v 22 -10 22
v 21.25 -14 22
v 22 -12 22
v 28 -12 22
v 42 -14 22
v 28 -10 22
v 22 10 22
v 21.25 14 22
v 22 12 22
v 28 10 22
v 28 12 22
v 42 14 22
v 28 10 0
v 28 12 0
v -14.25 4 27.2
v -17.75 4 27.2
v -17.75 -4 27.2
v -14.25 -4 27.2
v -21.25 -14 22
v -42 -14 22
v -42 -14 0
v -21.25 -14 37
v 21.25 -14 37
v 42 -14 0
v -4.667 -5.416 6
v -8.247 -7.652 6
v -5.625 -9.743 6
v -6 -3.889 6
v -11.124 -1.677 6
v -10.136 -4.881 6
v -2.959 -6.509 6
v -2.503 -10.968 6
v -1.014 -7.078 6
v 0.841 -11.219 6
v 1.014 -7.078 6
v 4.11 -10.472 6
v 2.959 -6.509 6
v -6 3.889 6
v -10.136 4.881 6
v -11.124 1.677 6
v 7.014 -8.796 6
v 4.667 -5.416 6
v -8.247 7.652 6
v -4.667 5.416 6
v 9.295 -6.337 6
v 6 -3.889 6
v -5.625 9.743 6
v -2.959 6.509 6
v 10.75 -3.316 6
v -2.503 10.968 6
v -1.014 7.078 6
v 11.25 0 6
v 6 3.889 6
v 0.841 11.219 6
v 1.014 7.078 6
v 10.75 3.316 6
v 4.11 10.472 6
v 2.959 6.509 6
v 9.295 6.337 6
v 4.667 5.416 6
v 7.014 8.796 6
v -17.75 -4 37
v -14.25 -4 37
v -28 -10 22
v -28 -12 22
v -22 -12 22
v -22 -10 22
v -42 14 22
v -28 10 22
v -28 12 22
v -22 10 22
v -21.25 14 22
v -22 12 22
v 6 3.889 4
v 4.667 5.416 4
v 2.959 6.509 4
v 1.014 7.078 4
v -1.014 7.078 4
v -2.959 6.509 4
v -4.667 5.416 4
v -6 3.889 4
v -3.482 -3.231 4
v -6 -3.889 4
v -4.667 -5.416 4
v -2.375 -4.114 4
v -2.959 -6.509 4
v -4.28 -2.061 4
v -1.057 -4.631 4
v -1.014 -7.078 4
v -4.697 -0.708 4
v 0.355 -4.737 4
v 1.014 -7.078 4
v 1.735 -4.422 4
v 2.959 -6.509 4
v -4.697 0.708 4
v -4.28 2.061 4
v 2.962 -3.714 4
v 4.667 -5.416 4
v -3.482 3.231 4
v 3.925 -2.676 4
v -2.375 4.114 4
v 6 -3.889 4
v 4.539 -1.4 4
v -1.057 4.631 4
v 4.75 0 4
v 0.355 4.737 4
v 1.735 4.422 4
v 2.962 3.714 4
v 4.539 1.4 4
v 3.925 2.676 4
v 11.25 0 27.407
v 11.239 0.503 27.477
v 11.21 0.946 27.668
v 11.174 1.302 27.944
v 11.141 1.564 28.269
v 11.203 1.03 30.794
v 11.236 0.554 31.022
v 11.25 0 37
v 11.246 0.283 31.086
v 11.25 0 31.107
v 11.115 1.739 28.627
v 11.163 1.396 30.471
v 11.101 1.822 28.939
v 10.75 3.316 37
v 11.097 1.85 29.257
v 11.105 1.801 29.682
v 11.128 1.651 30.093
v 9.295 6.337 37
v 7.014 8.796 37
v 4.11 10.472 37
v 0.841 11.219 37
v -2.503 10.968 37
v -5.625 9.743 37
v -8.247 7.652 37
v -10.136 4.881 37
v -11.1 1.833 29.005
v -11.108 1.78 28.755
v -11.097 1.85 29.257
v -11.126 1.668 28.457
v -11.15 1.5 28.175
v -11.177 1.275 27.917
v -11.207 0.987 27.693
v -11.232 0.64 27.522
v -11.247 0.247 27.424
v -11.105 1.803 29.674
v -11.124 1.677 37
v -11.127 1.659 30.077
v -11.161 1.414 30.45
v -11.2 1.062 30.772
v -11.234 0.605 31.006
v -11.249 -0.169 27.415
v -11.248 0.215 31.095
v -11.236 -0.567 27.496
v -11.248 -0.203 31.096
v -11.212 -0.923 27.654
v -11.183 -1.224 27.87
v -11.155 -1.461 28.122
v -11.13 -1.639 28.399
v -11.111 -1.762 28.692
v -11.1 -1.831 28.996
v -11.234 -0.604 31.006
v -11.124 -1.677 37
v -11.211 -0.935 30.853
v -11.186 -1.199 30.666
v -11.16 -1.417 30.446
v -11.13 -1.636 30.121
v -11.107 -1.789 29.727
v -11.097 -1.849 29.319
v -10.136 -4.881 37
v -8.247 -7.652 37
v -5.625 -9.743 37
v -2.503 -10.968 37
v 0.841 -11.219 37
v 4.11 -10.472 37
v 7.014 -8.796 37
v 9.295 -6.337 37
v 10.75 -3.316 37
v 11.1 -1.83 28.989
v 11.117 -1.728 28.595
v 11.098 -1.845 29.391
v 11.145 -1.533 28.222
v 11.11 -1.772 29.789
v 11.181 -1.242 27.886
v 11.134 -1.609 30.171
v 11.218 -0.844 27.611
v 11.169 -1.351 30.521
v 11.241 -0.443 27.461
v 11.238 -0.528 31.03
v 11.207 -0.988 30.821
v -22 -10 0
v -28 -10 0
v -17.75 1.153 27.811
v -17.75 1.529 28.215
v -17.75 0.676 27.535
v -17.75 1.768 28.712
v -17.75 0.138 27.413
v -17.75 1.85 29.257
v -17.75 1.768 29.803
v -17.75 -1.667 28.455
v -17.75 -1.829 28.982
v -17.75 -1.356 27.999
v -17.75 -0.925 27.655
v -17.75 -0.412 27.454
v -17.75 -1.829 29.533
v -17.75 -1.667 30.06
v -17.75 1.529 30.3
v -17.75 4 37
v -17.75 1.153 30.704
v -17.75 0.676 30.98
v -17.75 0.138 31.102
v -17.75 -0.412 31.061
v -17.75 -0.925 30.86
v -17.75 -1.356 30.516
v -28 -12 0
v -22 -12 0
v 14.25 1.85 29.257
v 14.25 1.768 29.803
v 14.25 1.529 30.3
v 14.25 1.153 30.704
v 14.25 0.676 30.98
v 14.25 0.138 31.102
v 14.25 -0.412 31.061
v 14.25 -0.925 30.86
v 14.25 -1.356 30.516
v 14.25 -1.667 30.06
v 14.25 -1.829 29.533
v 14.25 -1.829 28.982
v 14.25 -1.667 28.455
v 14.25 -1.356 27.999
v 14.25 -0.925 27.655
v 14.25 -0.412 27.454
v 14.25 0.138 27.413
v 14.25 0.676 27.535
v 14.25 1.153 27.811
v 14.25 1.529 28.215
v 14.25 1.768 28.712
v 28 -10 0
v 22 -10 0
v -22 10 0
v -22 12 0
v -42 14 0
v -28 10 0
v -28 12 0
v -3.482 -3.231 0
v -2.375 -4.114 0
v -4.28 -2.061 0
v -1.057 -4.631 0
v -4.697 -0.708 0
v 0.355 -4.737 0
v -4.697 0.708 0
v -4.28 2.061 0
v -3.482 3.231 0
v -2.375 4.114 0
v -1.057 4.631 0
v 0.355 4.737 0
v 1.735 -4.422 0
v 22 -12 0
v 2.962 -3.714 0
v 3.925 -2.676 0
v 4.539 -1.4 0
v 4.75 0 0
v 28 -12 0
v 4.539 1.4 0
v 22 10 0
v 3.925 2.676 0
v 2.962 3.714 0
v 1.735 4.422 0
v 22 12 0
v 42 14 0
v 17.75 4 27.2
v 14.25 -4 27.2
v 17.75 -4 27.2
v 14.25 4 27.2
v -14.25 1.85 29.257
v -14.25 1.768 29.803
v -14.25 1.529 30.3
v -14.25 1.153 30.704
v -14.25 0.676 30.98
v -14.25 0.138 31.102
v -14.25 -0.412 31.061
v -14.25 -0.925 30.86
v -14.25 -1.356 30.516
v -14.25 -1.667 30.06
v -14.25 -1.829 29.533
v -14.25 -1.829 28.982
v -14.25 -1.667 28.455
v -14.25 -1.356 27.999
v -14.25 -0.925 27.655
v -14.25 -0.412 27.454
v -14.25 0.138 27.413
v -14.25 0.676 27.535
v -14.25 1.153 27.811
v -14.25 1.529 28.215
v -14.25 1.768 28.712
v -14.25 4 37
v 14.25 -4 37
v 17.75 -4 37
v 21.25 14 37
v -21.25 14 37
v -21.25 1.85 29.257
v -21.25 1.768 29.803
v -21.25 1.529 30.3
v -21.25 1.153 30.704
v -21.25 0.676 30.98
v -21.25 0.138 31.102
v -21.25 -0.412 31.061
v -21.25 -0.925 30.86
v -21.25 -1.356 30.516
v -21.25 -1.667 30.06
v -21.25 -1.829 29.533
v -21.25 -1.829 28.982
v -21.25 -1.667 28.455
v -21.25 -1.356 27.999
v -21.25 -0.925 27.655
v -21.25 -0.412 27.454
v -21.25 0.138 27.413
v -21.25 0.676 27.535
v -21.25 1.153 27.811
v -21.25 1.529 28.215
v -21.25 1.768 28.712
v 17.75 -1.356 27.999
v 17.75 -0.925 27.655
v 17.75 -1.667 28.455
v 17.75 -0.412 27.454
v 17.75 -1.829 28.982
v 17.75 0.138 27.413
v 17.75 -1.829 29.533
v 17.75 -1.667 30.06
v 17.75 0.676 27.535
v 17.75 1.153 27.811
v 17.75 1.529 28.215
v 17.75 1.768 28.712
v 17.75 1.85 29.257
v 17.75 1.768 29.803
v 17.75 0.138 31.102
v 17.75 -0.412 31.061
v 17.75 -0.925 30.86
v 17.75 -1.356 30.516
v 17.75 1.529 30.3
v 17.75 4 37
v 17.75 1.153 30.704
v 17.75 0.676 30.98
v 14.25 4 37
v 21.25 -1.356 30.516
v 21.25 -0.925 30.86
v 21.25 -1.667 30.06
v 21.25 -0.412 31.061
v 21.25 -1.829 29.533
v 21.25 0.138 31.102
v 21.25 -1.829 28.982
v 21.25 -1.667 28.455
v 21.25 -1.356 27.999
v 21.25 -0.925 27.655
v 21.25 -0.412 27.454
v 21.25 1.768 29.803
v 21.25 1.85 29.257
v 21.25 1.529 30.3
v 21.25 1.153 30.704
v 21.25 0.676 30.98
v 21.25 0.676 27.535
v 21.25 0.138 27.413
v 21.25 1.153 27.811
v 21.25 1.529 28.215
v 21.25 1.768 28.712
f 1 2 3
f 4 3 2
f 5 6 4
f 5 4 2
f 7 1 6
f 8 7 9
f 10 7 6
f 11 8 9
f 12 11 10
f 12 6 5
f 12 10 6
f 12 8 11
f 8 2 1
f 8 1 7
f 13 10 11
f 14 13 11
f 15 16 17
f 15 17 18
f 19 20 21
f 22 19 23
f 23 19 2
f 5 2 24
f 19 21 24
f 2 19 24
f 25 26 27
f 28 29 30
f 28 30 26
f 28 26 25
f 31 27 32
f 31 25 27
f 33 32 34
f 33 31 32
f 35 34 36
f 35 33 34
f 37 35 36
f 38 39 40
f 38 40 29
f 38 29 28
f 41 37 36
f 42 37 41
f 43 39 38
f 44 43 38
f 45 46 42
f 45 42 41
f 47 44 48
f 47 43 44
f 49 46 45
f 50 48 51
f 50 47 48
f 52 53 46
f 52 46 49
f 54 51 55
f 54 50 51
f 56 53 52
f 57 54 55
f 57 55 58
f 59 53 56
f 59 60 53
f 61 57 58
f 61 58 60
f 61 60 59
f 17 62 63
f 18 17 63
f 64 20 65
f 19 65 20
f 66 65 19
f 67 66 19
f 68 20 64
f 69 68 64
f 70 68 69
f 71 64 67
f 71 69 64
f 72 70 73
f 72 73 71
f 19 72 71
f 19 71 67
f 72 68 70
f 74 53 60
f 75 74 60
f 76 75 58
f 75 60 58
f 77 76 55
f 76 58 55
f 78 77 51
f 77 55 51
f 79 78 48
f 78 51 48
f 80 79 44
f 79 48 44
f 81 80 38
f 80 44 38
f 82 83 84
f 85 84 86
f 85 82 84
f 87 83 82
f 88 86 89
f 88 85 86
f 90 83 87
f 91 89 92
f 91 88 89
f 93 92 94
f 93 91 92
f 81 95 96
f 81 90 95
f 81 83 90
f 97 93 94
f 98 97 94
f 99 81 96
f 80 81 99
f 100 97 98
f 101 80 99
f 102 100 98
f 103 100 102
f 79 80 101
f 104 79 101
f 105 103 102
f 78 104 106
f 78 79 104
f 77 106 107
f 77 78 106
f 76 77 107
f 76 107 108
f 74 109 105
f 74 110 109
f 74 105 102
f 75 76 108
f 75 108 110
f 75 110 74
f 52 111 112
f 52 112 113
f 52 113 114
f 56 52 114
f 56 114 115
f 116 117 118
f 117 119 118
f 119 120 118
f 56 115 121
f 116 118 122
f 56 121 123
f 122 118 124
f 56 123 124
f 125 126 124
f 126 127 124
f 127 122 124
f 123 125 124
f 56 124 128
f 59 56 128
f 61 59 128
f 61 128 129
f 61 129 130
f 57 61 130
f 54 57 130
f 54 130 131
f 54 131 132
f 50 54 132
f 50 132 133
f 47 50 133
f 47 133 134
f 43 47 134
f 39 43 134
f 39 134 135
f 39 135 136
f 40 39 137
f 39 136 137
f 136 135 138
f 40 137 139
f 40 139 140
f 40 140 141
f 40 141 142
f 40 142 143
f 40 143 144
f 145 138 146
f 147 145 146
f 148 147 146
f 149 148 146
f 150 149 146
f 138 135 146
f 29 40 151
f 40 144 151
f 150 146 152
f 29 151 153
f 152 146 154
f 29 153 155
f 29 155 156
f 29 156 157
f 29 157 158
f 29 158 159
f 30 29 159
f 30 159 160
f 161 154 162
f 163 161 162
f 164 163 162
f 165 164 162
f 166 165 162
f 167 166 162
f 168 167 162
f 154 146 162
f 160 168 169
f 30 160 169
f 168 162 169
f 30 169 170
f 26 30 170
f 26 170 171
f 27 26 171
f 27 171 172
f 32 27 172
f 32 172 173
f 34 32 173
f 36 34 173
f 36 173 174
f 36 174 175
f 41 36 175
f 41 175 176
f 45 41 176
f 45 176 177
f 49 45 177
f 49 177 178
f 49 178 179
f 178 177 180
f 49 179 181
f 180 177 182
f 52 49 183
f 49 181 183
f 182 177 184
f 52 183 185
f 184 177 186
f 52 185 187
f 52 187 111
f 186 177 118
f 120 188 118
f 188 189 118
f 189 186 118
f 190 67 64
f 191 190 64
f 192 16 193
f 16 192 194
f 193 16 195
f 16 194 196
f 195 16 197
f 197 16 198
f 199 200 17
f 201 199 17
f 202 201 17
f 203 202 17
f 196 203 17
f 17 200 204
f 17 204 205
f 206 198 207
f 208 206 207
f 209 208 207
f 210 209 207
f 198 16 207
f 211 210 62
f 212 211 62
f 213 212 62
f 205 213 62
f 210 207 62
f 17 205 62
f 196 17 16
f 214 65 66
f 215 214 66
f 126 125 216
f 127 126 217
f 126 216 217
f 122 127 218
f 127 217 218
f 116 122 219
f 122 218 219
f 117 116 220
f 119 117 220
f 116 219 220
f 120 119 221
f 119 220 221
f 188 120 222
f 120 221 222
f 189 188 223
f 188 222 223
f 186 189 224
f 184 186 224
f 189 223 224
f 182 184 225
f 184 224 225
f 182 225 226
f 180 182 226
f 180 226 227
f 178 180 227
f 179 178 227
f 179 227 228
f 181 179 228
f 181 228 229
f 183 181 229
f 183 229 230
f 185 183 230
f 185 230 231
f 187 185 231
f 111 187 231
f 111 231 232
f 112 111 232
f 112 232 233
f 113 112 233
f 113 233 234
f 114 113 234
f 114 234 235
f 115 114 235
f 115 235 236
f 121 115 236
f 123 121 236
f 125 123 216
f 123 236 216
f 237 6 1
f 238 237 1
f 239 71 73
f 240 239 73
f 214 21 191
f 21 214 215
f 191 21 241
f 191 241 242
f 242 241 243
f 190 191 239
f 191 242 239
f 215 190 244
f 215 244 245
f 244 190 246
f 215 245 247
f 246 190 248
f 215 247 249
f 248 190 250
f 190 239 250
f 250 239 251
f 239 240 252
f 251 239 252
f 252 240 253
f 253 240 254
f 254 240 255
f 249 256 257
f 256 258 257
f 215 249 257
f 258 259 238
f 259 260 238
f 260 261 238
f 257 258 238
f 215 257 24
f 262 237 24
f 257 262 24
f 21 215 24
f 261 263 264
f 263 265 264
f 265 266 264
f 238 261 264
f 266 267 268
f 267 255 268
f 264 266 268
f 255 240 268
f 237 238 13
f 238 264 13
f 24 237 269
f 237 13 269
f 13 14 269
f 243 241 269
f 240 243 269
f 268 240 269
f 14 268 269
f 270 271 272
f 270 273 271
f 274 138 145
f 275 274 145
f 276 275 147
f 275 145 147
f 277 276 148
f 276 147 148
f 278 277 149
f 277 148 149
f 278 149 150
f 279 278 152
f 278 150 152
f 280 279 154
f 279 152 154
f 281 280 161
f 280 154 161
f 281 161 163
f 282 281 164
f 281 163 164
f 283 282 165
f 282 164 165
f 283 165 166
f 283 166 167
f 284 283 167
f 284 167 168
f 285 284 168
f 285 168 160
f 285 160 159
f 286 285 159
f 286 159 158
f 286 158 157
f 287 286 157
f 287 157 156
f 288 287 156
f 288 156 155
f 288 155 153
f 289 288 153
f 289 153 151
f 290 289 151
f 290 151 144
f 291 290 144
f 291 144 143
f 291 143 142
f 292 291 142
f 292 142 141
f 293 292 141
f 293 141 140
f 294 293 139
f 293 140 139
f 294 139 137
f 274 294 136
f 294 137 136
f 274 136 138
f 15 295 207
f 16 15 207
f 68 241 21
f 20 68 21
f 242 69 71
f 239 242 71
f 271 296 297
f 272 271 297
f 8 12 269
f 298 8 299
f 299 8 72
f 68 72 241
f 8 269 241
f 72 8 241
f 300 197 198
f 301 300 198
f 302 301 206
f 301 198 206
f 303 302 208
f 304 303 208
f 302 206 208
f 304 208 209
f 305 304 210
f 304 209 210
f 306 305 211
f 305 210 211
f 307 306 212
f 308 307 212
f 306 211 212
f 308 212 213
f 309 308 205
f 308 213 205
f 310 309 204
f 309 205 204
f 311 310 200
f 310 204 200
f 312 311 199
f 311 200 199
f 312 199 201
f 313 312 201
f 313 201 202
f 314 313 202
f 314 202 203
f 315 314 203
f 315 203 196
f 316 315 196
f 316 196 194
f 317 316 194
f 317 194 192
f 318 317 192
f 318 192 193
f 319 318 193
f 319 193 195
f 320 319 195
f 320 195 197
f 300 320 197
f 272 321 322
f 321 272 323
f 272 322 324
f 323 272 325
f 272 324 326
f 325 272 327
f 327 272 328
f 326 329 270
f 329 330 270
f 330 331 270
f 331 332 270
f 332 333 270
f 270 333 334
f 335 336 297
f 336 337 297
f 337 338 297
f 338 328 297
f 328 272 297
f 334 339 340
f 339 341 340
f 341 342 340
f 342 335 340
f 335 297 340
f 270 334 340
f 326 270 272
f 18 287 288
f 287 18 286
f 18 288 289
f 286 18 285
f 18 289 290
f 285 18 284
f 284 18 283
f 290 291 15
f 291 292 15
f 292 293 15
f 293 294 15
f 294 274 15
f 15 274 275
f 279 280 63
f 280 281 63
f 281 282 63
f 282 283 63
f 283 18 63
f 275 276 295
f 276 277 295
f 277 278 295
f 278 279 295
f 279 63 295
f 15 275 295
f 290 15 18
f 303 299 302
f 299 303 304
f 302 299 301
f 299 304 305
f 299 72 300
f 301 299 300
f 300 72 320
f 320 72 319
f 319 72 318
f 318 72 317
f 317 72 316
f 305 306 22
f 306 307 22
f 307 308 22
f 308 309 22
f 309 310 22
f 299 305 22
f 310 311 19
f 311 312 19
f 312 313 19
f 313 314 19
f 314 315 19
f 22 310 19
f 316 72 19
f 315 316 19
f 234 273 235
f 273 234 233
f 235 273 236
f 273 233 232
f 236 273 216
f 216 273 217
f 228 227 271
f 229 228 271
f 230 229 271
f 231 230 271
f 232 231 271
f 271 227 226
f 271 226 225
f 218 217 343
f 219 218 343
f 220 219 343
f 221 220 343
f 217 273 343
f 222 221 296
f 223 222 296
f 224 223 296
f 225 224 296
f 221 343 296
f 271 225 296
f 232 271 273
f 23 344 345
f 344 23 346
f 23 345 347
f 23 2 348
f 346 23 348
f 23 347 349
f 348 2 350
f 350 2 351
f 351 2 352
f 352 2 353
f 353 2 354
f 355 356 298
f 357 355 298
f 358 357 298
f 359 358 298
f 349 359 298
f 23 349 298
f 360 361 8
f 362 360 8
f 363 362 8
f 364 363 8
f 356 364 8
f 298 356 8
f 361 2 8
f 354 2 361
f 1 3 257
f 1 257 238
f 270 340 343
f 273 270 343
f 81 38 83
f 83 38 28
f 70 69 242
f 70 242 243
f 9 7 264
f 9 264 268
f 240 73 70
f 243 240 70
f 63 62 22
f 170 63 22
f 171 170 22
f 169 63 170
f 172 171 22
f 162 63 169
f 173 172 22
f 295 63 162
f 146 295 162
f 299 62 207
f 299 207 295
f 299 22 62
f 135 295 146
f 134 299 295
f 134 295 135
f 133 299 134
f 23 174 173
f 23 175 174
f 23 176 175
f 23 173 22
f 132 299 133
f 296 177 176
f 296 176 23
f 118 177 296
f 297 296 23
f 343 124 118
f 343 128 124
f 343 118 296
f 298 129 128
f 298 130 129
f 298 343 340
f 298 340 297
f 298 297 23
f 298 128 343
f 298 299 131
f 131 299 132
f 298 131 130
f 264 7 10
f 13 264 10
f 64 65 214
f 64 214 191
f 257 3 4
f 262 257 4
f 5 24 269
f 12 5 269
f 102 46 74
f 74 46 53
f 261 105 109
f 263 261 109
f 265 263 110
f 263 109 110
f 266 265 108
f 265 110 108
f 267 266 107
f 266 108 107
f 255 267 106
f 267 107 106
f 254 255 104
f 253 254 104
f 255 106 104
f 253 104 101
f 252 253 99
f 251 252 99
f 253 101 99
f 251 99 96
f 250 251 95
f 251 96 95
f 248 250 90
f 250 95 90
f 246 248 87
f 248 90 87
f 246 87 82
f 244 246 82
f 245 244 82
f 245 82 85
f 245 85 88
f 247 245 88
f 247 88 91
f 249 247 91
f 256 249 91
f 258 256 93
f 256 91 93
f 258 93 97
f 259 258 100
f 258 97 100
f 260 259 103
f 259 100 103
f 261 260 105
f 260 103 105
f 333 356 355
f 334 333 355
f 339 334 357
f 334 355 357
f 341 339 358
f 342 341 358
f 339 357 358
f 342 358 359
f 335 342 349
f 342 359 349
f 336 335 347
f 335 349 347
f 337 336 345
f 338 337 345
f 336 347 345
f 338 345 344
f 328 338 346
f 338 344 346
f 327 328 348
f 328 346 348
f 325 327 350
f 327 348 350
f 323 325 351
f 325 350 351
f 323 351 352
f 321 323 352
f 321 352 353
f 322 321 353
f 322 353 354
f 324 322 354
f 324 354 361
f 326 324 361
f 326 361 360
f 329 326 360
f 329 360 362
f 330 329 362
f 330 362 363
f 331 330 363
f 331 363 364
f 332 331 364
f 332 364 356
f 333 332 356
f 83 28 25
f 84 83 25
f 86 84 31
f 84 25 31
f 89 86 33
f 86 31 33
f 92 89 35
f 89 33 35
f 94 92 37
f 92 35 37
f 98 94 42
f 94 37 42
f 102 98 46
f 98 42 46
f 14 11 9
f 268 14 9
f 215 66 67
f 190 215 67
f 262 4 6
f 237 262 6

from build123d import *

# Parameters (mm, degrees)
F1_DEPTH  = 22
F3_R      = 11.25
F4_DEPTH  = 16
F5_DEPTH  = 18
F6_R      = 4.75
F7_DEPTH  = 4
F8_W      = 3
F8_H      = 2
F9_DEPTH  = 22
F11_DEPTH = 15
F12_R     = 11.25
F13_DEPTH = 15
F14_R     = 1.85
F15_DEPTH = 50.8
F17_DEPTH = 9.8


# Not quite as in the source:
# - a feature names something its author has since deleted; it is built from what else it names


with BuildPart() as f1:
    # F0 (on Top) → F1 (new body)
    with BuildSketch(Plane.XY):
        with BuildLine():
            ThreePointArc((1.21e-08, -14), (9.8994949409, -9.8994949323), (14, 0))
            ThreePointArc((14, 0), (9.8994949202, 9.899494953), (-4.65e-08, 14))
            ThreePointArc((-4.65e-08, 14), (-14, -2.93e-08), (1.21e-08, -14))
        make_face()
        with BuildLine():
            ThreePointArc((-4.65e-08, 14), (9.8994949202, 9.899494953), (14, 0))
            ThreePointArc((14, 0), (9.8994949409, -9.8994949323), (1.21e-08, -14))
            Line((1.21e-08, -14), (42, -14))
            Line((42, -14), (42, 14))
            Line((42, 14), (-4.65e-08, 14))
        make_face()
        with BuildLine():
            ThreePointArc((1.21e-08, -14), (-14, -2.93e-08), (-4.65e-08, 14))
            Line((-4.65e-08, 14), (-42, 14))
            Line((-42, 14), (-42, -14))
            Line((-42, -14), (1.21e-08, -14))
        make_face()
    extrude(amount=F1_DEPTH)

    # F3 (on face) → F4 (cut)
    with BuildSketch(Plane.XY.offset(22)):
        Circle(F3_R)
    extrude(amount=-F4_DEPTH, mode=Mode.SUBTRACT)

    # F2 (on face) → F5 (cut)
    with BuildSketch(Plane.XY.offset(22)):
        with BuildLine():
            Line((-6, 3.8887658711), (-6, -3.8887658711))
            ThreePointArc((-6, -3.8887658711), (0, -7.15), (6, -3.8887658711))
            Line((6, -3.8887658711), (6, 3.8887658711))
            ThreePointArc((6, 3.8887658711), (0, 7.15), (-6, 3.8887658711))
        make_face()
    extrude(amount=-F5_DEPTH, mode=Mode.SUBTRACT)

    # F6 (on face) → F7 (cut)
    with BuildSketch(Plane.XY.offset(4)):
        Circle(F6_R)
    extrude(amount=-F7_DEPTH, mode=Mode.SUBTRACT)

    # F8 (on face) → F9 (cut)
    with BuildSketch(Plane.XY.offset(22)):
        with Locations((-26.5, 11)):
            Rectangle(F8_W, F8_H)
        with Locations((-23.5, 11)):
            Rectangle(F8_W, F8_H)
        with Locations((-23.5, -11)):
            Rectangle(F8_W, F8_H)
        with Locations((-26.5, -11)):
            Rectangle(F8_W, F8_H)
        with Locations((23.5, 11)):
            Rectangle(F8_W, F8_H)
        with Locations((26.5, 11)):
            Rectangle(F8_W, F8_H)
        with Locations((26.5, -11)):
            Rectangle(F8_W, F8_H)
        with Locations((23.5, -11)):
            Rectangle(F8_W, F8_H)
    extrude(amount=-F9_DEPTH, mode=Mode.SUBTRACT)

    # F10 (on face) → F11 (join)
    with BuildSketch(Plane.XY.offset(22)):
        Polygon((-21.25, -14), (21.25, -14), (21.25, 0), (21.25, 14), (-21.25, 14), align=None)
    extrude(amount=F11_DEPTH)

    # F12 (on face) → F13 (cut)
    with BuildSketch(Plane.XY.offset(37)):
        Circle(F12_R)
    extrude(amount=-F13_DEPTH, mode=Mode.SUBTRACT)

    # F14 (on face) → F15 (cut)
    with BuildSketch(Plane.YZ.offset(21.25)):
        with Locations((0, 29.2573869228)):
            Circle(F14_R)
    extrude(amount=-F15_DEPTH, mode=Mode.SUBTRACT)

    # F16 (on face) → F17 (cut)
    with BuildSketch(Plane.XY.offset(37)):
        Polygon((-14.25, -4), (-14.25, 4), (-17.75, 4), (-17.75, 1.1981789721), (-17.75, -4), align=None)
        Polygon((14.25, -4), (17.75, -4), (17.75, 0), (17.75, 4), (14.25, 4), align=None)
    extrude(amount=-F17_DEPTH, mode=Mode.SUBTRACT)


solid = f1.part
